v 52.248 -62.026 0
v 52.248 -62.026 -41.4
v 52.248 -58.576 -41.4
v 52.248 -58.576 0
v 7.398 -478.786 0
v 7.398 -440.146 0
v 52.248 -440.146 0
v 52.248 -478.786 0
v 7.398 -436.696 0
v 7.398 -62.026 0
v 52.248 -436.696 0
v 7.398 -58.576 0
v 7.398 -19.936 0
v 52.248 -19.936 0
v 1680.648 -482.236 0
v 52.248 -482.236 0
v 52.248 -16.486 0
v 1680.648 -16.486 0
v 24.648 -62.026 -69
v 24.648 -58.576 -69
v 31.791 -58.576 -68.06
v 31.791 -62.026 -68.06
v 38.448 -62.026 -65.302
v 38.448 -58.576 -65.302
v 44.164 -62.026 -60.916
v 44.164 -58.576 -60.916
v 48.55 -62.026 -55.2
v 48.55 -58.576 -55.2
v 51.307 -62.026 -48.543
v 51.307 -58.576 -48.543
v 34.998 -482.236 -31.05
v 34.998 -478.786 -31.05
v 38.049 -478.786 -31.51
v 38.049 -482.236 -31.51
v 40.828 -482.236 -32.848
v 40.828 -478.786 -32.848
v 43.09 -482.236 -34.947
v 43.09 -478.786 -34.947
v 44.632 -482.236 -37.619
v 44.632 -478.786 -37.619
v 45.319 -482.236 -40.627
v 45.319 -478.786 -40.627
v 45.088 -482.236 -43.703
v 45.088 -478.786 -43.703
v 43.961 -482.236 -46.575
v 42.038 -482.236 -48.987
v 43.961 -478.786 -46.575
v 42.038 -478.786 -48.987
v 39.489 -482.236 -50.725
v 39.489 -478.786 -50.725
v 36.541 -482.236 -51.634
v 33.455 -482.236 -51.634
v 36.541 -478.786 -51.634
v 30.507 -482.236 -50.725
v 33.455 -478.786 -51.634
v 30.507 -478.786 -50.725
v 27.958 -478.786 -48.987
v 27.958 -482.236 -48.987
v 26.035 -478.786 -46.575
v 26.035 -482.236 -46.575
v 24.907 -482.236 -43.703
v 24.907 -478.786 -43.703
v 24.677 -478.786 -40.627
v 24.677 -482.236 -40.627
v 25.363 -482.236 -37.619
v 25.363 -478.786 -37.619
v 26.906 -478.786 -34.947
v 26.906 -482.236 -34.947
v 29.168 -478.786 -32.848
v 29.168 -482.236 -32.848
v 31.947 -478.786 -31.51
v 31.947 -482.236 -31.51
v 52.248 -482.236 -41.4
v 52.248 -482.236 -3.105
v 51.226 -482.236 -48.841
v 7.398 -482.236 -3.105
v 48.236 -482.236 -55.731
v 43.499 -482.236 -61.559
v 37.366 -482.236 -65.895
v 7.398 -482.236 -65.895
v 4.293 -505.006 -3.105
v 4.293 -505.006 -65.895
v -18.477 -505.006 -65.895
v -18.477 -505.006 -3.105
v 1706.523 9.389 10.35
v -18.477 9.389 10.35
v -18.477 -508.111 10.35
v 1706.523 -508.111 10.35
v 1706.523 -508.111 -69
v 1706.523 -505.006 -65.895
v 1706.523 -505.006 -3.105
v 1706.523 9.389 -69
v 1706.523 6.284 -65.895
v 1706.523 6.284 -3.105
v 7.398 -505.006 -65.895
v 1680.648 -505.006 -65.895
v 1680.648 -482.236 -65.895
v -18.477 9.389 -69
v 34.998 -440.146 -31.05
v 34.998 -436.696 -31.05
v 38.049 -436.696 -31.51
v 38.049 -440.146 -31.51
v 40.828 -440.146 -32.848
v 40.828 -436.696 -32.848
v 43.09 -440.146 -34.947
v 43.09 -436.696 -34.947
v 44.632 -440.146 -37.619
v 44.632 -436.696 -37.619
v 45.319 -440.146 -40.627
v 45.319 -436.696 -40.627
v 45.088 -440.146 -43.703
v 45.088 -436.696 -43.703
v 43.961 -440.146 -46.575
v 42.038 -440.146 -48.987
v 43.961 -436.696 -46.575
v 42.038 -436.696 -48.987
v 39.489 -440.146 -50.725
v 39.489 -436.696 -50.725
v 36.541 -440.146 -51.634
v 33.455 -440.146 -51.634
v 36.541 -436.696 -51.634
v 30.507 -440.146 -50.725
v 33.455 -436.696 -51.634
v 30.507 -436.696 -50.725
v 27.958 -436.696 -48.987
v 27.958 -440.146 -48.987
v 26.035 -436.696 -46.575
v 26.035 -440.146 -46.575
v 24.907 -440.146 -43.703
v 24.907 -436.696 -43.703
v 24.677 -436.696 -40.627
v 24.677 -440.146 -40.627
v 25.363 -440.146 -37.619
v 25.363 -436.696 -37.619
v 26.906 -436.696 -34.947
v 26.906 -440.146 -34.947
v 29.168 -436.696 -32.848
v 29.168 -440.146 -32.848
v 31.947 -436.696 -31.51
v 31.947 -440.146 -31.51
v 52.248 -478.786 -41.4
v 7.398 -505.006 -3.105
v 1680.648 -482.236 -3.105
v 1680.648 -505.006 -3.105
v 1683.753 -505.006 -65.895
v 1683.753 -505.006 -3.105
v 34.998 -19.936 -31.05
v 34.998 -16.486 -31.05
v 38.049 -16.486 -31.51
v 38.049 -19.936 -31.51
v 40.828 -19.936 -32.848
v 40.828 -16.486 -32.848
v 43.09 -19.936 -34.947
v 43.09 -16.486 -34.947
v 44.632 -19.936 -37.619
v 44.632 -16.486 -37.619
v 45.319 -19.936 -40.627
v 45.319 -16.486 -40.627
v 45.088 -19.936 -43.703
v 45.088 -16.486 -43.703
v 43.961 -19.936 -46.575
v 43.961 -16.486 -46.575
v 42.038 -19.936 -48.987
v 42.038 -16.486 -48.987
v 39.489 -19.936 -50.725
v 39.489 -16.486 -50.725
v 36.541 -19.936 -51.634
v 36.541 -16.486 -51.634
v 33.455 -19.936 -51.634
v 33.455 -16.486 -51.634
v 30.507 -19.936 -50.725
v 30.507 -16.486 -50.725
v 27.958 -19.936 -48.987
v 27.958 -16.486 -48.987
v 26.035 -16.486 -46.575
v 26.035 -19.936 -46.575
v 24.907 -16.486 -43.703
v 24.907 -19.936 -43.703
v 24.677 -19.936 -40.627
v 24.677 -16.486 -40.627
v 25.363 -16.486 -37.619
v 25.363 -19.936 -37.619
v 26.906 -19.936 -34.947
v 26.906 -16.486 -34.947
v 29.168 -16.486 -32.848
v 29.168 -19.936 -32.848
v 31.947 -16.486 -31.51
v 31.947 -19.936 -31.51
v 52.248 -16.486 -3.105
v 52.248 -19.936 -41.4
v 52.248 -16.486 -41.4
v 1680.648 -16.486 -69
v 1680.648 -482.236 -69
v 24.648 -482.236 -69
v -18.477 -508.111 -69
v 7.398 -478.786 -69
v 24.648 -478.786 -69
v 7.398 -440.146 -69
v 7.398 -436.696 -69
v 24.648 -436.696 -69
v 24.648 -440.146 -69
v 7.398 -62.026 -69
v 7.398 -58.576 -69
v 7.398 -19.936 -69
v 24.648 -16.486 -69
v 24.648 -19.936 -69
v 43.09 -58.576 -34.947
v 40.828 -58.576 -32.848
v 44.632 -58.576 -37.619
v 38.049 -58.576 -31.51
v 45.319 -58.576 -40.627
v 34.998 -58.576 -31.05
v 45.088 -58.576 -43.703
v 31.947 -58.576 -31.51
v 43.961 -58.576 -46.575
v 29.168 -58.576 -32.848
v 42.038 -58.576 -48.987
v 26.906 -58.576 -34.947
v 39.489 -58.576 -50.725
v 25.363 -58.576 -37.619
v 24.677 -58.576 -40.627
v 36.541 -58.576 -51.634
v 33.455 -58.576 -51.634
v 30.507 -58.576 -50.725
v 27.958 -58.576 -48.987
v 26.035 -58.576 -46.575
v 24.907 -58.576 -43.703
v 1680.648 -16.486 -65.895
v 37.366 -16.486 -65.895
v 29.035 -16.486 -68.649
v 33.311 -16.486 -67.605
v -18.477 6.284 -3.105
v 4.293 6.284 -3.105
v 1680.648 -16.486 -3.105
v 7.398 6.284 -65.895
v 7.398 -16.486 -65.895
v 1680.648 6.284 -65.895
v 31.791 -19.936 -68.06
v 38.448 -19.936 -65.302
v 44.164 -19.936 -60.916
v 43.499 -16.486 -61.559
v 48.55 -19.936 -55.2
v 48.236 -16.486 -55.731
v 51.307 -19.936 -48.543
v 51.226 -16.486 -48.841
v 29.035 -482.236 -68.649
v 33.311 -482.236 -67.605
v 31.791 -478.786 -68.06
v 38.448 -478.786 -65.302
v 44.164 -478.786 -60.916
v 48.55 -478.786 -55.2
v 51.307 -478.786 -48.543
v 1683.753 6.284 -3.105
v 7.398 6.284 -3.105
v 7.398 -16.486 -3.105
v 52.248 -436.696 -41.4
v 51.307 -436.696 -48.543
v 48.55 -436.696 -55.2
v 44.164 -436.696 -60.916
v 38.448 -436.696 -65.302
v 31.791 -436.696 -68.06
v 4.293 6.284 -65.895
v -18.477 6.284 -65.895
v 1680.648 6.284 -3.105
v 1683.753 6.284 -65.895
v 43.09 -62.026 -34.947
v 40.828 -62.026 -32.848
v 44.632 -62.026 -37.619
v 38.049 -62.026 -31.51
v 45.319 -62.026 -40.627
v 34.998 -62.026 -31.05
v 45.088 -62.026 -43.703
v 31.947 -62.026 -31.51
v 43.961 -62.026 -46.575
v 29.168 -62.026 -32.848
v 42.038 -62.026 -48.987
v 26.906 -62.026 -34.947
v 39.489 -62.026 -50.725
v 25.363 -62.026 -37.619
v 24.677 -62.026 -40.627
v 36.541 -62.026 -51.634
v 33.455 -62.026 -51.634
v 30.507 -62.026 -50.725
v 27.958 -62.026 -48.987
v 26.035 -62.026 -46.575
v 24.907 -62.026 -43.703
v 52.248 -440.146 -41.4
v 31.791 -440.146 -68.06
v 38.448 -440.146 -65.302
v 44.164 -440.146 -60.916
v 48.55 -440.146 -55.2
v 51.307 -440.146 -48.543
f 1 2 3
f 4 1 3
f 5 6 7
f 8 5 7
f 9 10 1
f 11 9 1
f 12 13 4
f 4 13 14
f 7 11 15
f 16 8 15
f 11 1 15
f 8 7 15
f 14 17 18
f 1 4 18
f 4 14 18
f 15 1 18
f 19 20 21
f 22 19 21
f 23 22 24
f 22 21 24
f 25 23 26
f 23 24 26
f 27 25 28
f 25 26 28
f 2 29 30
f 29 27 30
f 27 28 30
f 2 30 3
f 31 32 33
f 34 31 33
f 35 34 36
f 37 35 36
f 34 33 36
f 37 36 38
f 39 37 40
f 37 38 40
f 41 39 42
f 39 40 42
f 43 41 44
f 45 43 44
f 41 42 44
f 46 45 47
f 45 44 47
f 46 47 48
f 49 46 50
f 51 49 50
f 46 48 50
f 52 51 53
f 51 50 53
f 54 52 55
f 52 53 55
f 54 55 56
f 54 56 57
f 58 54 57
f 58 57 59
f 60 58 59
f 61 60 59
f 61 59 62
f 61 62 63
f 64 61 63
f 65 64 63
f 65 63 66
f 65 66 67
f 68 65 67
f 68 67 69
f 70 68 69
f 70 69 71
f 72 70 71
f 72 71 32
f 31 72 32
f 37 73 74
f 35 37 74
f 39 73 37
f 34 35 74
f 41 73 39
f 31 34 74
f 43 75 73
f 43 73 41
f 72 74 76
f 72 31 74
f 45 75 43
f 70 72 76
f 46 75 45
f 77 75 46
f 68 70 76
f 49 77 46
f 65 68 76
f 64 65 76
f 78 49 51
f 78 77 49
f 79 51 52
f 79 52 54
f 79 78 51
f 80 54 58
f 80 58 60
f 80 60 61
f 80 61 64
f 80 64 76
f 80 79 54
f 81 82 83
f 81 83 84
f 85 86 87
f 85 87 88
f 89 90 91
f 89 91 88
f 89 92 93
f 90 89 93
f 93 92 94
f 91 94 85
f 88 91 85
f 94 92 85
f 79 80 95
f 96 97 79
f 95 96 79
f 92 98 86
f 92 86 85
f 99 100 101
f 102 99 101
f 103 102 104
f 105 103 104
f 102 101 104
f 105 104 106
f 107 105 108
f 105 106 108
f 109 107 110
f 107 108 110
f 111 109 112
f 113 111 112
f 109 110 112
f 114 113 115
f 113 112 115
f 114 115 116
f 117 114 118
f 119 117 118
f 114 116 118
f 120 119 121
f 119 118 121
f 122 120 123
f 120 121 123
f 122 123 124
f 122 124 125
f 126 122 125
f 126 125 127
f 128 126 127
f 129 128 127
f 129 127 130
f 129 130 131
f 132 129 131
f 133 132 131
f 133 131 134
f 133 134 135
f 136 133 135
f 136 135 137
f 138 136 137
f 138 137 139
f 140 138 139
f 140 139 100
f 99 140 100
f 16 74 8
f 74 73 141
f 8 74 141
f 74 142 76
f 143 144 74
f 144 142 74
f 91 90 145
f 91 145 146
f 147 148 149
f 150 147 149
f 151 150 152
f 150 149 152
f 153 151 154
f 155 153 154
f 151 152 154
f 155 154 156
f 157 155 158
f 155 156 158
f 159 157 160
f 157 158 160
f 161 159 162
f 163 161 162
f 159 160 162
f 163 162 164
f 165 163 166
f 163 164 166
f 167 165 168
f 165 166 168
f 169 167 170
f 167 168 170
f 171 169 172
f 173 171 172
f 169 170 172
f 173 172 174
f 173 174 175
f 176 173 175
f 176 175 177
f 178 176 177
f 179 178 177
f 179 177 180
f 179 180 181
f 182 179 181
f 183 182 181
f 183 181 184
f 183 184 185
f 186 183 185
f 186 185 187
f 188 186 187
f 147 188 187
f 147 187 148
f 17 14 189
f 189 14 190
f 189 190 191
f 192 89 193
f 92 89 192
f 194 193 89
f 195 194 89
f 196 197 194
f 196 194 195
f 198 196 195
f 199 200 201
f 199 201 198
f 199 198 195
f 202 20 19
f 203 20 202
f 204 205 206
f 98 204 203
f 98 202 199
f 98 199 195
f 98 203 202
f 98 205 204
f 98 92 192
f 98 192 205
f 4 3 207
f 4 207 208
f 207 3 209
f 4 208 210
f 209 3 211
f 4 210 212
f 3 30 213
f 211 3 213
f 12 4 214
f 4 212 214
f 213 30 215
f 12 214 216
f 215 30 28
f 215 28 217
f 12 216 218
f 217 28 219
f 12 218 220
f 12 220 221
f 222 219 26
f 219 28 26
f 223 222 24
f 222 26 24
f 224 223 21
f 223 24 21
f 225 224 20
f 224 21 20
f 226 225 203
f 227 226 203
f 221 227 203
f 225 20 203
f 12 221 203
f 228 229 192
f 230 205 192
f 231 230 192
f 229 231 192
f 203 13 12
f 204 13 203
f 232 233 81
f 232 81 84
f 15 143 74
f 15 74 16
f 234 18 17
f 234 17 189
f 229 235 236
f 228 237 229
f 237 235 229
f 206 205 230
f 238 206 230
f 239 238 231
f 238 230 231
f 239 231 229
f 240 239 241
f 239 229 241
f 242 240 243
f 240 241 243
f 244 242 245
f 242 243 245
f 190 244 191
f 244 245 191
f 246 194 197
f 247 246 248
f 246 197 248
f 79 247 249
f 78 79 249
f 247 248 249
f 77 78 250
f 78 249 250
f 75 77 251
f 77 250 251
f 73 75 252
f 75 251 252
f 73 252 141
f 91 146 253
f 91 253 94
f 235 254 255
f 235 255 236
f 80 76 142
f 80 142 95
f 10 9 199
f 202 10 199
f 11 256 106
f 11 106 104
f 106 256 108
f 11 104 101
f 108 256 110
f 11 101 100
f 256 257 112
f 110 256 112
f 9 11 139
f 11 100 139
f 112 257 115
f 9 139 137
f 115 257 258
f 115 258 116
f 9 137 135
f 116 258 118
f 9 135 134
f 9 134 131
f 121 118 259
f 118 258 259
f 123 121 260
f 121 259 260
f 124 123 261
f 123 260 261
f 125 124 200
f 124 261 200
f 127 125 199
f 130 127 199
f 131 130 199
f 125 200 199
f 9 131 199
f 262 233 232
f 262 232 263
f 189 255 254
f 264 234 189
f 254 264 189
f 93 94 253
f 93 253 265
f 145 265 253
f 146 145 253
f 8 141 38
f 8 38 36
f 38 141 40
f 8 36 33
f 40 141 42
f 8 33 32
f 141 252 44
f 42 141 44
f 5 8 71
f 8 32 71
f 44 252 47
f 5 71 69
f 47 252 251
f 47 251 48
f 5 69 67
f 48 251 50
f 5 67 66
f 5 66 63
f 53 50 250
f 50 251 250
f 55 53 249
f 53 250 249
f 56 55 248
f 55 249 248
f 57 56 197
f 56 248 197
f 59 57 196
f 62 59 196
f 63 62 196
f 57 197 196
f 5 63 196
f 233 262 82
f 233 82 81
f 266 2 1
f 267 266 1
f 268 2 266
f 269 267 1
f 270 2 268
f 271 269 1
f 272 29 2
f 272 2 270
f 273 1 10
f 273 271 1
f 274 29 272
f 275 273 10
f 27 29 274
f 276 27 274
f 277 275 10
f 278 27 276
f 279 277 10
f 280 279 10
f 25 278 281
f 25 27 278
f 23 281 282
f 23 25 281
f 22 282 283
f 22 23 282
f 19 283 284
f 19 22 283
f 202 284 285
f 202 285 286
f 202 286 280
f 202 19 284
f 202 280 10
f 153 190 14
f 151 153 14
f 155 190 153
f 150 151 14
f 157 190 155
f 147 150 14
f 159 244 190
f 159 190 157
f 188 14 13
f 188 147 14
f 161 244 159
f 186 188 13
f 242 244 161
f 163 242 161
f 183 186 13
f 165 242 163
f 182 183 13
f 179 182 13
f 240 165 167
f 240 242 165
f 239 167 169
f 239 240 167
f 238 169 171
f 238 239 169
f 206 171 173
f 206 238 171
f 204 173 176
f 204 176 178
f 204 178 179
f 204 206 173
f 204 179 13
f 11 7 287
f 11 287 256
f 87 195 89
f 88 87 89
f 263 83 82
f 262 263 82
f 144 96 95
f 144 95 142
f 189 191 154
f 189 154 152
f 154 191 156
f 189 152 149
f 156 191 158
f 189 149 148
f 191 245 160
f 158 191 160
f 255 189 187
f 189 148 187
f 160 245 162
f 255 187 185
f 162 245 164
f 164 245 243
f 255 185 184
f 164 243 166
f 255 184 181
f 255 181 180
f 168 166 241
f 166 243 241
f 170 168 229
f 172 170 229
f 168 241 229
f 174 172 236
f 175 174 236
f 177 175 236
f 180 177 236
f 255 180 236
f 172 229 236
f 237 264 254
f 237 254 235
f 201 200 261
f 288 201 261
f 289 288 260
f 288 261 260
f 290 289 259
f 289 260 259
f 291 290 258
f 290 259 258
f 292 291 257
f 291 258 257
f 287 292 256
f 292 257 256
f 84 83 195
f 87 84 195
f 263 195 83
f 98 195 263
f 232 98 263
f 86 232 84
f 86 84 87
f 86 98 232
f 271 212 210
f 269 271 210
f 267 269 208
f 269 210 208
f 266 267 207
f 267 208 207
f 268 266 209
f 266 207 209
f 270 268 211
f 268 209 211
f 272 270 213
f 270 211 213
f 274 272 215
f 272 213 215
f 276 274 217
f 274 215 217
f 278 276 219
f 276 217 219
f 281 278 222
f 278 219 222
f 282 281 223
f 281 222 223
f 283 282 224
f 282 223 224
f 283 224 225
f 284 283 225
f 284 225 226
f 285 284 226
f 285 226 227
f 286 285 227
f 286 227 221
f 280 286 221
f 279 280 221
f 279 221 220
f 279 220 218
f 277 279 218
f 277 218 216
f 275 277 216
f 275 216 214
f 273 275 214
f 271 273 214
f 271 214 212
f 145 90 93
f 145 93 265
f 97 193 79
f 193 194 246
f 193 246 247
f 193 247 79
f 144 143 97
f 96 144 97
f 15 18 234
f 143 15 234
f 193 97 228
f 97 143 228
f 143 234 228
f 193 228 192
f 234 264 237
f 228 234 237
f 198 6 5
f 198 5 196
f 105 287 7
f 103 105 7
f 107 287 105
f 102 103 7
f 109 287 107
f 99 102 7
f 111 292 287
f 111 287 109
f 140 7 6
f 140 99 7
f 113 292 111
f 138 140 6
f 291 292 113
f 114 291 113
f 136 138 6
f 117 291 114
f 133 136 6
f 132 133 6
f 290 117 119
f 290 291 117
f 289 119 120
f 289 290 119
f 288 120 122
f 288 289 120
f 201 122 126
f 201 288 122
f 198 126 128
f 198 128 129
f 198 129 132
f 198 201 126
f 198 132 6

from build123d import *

# Parameters (mm, degrees)
SKETCH_1_W          = 5000
SKETCH_1_H          = 1500
EXTRUDE_1_DEPTH     = 30
EXTRUDE_2_DEPTH     = 1500
EXTRUDE_3_REACH     = 5218.234
EXTRUDE_4_REACH     = 5168.168
SKETCH_5_W          = 130
SKETCH_5_H          = 10
FILLET_2_R          = 80
SKETCH_6_R          = 30
CUT_EXTRUDE_1_DEPTH = 1355
SCALE_1_SCALE       = 0.345


with BuildPart() as part:
    # 草图1 → 凸台-拉伸1 (new body)
    with BuildSketch(Plane.XY):
        with Locations((2446.443283418, -722.784179357)):
            Rectangle(SKETCH_1_W, SKETCH_1_H)
    extrude(amount=EXTRUDE_1_DEPTH)

    # 草图3 → 凸台-拉伸2 (add)
    with BuildSketch(Plane(origin=(0, 27.215820643, 0), x_dir=(1, 0, 0), z_dir=(0, 1, 0))):
        Polygon((-53.556716582, 0), (21.443283418, 0), (21.443283418, 200), (-53.556716582, 200), (-53.556716582, 191), (12.443283418, 191), (12.443283418, 9), (-53.556716582, 9), align=None)
        Polygon((4946.443283418, 9), (4946.443283418, 0), (4871.443283418, 0), (4871.443283418, 200), (4946.443283418, 200), (4946.443283418, 191), (4880.443283418, 191), (4880.443283418, 9), align=None)
    extrude(amount=-EXTRUDE_2_DEPTH)

    # 凸台-拉伸3: up to this face of the body (flat: up to its plane)
    extrude_3_end = Plane(part.part.faces().sort_by_distance((-53.556716582, -722.784179357, 10.5))[0])
    # 草图4 → 凸台-拉伸3 (add, up to the picked face)
    with BuildSketch(Plane(origin=(4946.443283418, 0, 0), x_dir=(0, 0, -1), z_dir=(1, 0, 0)), mode=Mode.PRIVATE) as extrude_3_sk1:
        Polygon((200, 27.215820643), (0, 27.215820643), (0, -47.784179357), (9, -47.784179357), (9, 18.215820643), (191, 18.215820643), (191, -47.784179357), (200, -47.784179357), align=None)
    extrude_3_tool1 = split(extrude(extrude_3_sk1.sketch, amount=-EXTRUDE_3_REACH, mode=Mode.PRIVATE), bisect_by=extrude_3_end, keep=Keep.BOTH, mode=Mode.PRIVATE)
    # 草图4 → 凸台-拉伸3 (add, up to the picked face)
    with BuildSketch(Plane(origin=(4946.443283418, 0, 0), x_dir=(0, 0, -1), z_dir=(1, 0, 0)), mode=Mode.PRIVATE) as extrude_3_sk2:
        Polygon((9, -1397.784179357), (0, -1397.784179357), (0, -1472.784179357), (200, -1472.784179357), (200, -1397.784179357), (191, -1397.784179357), (191, -1463.784179357), (9, -1463.784179357), align=None)
    extrude_3_tool2 = split(extrude(extrude_3_sk2.sketch, amount=-EXTRUDE_3_REACH, mode=Mode.PRIVATE), bisect_by=extrude_3_end, keep=Keep.BOTH, mode=Mode.PRIVATE)
    add(extrude_3_tool1.solids().sort_by(Axis((4946.443283, 25.07982, -100), (-1, 0, 0)))[0])
    add(extrude_3_tool2.solids().sort_by(Axis((4946.443283, -1399.92018, -4.5), (-1, 0, 0)))[0])

    # 凸台-拉伸4: up to this face of the body (flat: up to its plane)
    extrude_4_end = Plane(part.part.faces().sort_by_distance((2446.443283418, -722.784179357, 0))[0])
    # 草图5 → 凸台-拉伸4 (add, up to the picked face)
    with BuildSketch(Plane(origin=(0, 0, -200), x_dir=(-1, 0, 0), z_dir=(0, 0, -1)), mode=Mode.PRIVATE) as extrude_4_sk1:
        with Locations((-86.443283418, -52.784179357)):
            Rectangle(SKETCH_5_W, SKETCH_5_H)
    extrude_4_tool1 = split(extrude(extrude_4_sk1.sketch, amount=-EXTRUDE_4_REACH, mode=Mode.PRIVATE), bisect_by=extrude_4_end, keep=Keep.BOTH, mode=Mode.PRIVATE)
    # 草图5 → 凸台-拉伸4 (add, up to the picked face)
    with BuildSketch(Plane(origin=(0, 0, -200), x_dir=(-1, 0, 0), z_dir=(0, 0, -1)), mode=Mode.PRIVATE) as extrude_4_sk2:
        with Locations((-86.443283418, -174.784179357)):
            Rectangle(SKETCH_5_W, SKETCH_5_H)
    extrude_4_tool2 = split(extrude(extrude_4_sk2.sketch, amount=-EXTRUDE_4_REACH, mode=Mode.PRIVATE), bisect_by=extrude_4_end, keep=Keep.BOTH, mode=Mode.PRIVATE)
    # 草图5 → 凸台-拉伸4 (add, up to the picked face)
    with BuildSketch(Plane(origin=(0, 0, -200), x_dir=(-1, 0, 0), z_dir=(0, 0, -1)), mode=Mode.PRIVATE) as extrude_4_sk3:
        with Locations((-86.443283418, -1270.784179357)):
            Rectangle(SKETCH_5_W, SKETCH_5_H)
    extrude_4_tool3 = split(extrude(extrude_4_sk3.sketch, amount=-EXTRUDE_4_REACH, mode=Mode.PRIVATE), bisect_by=extrude_4_end, keep=Keep.BOTH, mode=Mode.PRIVATE)
    # 草图5 → 凸台-拉伸4 (add, up to the picked face)
    with BuildSketch(Plane(origin=(0, 0, -200), x_dir=(-1, 0, 0), z_dir=(0, 0, -1)), mode=Mode.PRIVATE) as extrude_4_sk4:
        with Locations((-86.443283418, -1392.784179357)):
            Rectangle(SKETCH_5_W, SKETCH_5_H)
    extrude_4_tool4 = split(extrude(extrude_4_sk4.sketch, amount=-EXTRUDE_4_REACH, mode=Mode.PRIVATE), bisect_by=extrude_4_end, keep=Keep.BOTH, mode=Mode.PRIVATE)
    add(extrude_4_tool1.solids().sort_by(Axis((86.443283, -52.784179, -200), (0, 0, 1)))[0])
    add(extrude_4_tool2.solids().sort_by(Axis((86.443283, -174.784179, -200), (0, 0, 1)))[0])
    add(extrude_4_tool3.solids().sort_by(Axis((86.443283, -1270.784179, -200), (0, 0, 1)))[0])
    add(extrude_4_tool4.solids().sort_by(Axis((86.443283, -1392.784179, -200), (0, 0, 1)))[0])

    # 圆角2
    # the kernel refuses this fillet: 80 mm, written as the material it takes off along each edge
    with BuildSketch(Plane(origin=(151.443283418, -47.784179357, -200), x_dir=(-1, 0, 0), z_dir=(0, -1, 0))) as fillet_2_piece_1:
        with BuildLine():
            CenterArc((FILLET_2_R, -FILLET_2_R), FILLET_2_R, 90, 90)
            Line((0, -FILLET_2_R), (0, 0))
            Line((0, 0), (FILLET_2_R, 0))
        make_face()
    extrude(amount=210, mode=Mode.SUBTRACT)
    with BuildSketch(Plane(origin=(151.443283418, 30.215820643, -200), x_dir=(-1, 0, 0), z_dir=(0, -1, 0))) as fillet_2_piece_2_section:
        with BuildLine():
            CenterArc((FILLET_2_R, -FILLET_2_R), FILLET_2_R, 90, 90)
            Line((0, -FILLET_2_R), (0, 0))
            Line((0, 0), (FILLET_2_R, 0))
        make_face()
    fillet_2_piece_2 = extrude(amount=410, mode=Mode.PRIVATE)
    fillet_2_piece_2 = split(fillet_2_piece_2, bisect_by=Plane(origin=(123.199877996, -47.784179357, -195.897838893), z_dir=(0, -1, 0)), keep=Keep.TOP, mode=Mode.PRIVATE)
    add(fillet_2_piece_2, mode=Mode.SUBTRACT)
    with BuildSketch(Plane(origin=(151.443283418, -1065.784179357, -200), x_dir=(-1, 0, 0), z_dir=(0, -1, 0))) as fillet_2_piece_3_section:
        with BuildLine():
            CenterArc((FILLET_2_R, -FILLET_2_R), FILLET_2_R, 90, 90)
            Line((0, -FILLET_2_R), (0, 0))
            Line((0, 0), (FILLET_2_R, 0))
        make_face()
    fillet_2_piece_3 = extrude(amount=410, mode=Mode.PRIVATE)
    fillet_2_piece_3 = split(fillet_2_piece_3, bisect_by=Plane(origin=(123.199877996, -1397.784179357, -195.897838893), z_dir=(0, 1, 0)), keep=Keep.TOP, mode=Mode.PRIVATE)
    add(fillet_2_piece_3, mode=Mode.SUBTRACT)
    with BuildSketch(Plane(origin=(151.443283418, -1397.784179357, -200), x_dir=(-1, 0, 0), z_dir=(0, 1, 0))) as fillet_2_piece_4:
        with BuildLine():
            CenterArc((FILLET_2_R, FILLET_2_R), FILLET_2_R, 180, 90)
            Line((0, FILLET_2_R), (0, 0))
            Line((0, 0), (FILLET_2_R, 0))
        make_face()
    extrude(amount=210, mode=Mode.SUBTRACT)

    # 草图6 → 切除-拉伸1 (cut)
    with BuildSketch(Plane(origin=(0, -47.784179357, 0), x_dir=(1, 0, 0), z_dir=(0, 1, 0))):
        with Locations(Location((101.443283418, 120, 0), (0, 0, 270))):
            Circle(SKETCH_6_R)
    extrude(amount=-CUT_EXTRUDE_1_DEPTH, mode=Mode.SUBTRACT)


with BuildPart() as part_1:
    # 缩放比例1: scaled about (0, 0, 0)
    add(part.part.scale(SCALE_1_SCALE))


solid = part_1.part
